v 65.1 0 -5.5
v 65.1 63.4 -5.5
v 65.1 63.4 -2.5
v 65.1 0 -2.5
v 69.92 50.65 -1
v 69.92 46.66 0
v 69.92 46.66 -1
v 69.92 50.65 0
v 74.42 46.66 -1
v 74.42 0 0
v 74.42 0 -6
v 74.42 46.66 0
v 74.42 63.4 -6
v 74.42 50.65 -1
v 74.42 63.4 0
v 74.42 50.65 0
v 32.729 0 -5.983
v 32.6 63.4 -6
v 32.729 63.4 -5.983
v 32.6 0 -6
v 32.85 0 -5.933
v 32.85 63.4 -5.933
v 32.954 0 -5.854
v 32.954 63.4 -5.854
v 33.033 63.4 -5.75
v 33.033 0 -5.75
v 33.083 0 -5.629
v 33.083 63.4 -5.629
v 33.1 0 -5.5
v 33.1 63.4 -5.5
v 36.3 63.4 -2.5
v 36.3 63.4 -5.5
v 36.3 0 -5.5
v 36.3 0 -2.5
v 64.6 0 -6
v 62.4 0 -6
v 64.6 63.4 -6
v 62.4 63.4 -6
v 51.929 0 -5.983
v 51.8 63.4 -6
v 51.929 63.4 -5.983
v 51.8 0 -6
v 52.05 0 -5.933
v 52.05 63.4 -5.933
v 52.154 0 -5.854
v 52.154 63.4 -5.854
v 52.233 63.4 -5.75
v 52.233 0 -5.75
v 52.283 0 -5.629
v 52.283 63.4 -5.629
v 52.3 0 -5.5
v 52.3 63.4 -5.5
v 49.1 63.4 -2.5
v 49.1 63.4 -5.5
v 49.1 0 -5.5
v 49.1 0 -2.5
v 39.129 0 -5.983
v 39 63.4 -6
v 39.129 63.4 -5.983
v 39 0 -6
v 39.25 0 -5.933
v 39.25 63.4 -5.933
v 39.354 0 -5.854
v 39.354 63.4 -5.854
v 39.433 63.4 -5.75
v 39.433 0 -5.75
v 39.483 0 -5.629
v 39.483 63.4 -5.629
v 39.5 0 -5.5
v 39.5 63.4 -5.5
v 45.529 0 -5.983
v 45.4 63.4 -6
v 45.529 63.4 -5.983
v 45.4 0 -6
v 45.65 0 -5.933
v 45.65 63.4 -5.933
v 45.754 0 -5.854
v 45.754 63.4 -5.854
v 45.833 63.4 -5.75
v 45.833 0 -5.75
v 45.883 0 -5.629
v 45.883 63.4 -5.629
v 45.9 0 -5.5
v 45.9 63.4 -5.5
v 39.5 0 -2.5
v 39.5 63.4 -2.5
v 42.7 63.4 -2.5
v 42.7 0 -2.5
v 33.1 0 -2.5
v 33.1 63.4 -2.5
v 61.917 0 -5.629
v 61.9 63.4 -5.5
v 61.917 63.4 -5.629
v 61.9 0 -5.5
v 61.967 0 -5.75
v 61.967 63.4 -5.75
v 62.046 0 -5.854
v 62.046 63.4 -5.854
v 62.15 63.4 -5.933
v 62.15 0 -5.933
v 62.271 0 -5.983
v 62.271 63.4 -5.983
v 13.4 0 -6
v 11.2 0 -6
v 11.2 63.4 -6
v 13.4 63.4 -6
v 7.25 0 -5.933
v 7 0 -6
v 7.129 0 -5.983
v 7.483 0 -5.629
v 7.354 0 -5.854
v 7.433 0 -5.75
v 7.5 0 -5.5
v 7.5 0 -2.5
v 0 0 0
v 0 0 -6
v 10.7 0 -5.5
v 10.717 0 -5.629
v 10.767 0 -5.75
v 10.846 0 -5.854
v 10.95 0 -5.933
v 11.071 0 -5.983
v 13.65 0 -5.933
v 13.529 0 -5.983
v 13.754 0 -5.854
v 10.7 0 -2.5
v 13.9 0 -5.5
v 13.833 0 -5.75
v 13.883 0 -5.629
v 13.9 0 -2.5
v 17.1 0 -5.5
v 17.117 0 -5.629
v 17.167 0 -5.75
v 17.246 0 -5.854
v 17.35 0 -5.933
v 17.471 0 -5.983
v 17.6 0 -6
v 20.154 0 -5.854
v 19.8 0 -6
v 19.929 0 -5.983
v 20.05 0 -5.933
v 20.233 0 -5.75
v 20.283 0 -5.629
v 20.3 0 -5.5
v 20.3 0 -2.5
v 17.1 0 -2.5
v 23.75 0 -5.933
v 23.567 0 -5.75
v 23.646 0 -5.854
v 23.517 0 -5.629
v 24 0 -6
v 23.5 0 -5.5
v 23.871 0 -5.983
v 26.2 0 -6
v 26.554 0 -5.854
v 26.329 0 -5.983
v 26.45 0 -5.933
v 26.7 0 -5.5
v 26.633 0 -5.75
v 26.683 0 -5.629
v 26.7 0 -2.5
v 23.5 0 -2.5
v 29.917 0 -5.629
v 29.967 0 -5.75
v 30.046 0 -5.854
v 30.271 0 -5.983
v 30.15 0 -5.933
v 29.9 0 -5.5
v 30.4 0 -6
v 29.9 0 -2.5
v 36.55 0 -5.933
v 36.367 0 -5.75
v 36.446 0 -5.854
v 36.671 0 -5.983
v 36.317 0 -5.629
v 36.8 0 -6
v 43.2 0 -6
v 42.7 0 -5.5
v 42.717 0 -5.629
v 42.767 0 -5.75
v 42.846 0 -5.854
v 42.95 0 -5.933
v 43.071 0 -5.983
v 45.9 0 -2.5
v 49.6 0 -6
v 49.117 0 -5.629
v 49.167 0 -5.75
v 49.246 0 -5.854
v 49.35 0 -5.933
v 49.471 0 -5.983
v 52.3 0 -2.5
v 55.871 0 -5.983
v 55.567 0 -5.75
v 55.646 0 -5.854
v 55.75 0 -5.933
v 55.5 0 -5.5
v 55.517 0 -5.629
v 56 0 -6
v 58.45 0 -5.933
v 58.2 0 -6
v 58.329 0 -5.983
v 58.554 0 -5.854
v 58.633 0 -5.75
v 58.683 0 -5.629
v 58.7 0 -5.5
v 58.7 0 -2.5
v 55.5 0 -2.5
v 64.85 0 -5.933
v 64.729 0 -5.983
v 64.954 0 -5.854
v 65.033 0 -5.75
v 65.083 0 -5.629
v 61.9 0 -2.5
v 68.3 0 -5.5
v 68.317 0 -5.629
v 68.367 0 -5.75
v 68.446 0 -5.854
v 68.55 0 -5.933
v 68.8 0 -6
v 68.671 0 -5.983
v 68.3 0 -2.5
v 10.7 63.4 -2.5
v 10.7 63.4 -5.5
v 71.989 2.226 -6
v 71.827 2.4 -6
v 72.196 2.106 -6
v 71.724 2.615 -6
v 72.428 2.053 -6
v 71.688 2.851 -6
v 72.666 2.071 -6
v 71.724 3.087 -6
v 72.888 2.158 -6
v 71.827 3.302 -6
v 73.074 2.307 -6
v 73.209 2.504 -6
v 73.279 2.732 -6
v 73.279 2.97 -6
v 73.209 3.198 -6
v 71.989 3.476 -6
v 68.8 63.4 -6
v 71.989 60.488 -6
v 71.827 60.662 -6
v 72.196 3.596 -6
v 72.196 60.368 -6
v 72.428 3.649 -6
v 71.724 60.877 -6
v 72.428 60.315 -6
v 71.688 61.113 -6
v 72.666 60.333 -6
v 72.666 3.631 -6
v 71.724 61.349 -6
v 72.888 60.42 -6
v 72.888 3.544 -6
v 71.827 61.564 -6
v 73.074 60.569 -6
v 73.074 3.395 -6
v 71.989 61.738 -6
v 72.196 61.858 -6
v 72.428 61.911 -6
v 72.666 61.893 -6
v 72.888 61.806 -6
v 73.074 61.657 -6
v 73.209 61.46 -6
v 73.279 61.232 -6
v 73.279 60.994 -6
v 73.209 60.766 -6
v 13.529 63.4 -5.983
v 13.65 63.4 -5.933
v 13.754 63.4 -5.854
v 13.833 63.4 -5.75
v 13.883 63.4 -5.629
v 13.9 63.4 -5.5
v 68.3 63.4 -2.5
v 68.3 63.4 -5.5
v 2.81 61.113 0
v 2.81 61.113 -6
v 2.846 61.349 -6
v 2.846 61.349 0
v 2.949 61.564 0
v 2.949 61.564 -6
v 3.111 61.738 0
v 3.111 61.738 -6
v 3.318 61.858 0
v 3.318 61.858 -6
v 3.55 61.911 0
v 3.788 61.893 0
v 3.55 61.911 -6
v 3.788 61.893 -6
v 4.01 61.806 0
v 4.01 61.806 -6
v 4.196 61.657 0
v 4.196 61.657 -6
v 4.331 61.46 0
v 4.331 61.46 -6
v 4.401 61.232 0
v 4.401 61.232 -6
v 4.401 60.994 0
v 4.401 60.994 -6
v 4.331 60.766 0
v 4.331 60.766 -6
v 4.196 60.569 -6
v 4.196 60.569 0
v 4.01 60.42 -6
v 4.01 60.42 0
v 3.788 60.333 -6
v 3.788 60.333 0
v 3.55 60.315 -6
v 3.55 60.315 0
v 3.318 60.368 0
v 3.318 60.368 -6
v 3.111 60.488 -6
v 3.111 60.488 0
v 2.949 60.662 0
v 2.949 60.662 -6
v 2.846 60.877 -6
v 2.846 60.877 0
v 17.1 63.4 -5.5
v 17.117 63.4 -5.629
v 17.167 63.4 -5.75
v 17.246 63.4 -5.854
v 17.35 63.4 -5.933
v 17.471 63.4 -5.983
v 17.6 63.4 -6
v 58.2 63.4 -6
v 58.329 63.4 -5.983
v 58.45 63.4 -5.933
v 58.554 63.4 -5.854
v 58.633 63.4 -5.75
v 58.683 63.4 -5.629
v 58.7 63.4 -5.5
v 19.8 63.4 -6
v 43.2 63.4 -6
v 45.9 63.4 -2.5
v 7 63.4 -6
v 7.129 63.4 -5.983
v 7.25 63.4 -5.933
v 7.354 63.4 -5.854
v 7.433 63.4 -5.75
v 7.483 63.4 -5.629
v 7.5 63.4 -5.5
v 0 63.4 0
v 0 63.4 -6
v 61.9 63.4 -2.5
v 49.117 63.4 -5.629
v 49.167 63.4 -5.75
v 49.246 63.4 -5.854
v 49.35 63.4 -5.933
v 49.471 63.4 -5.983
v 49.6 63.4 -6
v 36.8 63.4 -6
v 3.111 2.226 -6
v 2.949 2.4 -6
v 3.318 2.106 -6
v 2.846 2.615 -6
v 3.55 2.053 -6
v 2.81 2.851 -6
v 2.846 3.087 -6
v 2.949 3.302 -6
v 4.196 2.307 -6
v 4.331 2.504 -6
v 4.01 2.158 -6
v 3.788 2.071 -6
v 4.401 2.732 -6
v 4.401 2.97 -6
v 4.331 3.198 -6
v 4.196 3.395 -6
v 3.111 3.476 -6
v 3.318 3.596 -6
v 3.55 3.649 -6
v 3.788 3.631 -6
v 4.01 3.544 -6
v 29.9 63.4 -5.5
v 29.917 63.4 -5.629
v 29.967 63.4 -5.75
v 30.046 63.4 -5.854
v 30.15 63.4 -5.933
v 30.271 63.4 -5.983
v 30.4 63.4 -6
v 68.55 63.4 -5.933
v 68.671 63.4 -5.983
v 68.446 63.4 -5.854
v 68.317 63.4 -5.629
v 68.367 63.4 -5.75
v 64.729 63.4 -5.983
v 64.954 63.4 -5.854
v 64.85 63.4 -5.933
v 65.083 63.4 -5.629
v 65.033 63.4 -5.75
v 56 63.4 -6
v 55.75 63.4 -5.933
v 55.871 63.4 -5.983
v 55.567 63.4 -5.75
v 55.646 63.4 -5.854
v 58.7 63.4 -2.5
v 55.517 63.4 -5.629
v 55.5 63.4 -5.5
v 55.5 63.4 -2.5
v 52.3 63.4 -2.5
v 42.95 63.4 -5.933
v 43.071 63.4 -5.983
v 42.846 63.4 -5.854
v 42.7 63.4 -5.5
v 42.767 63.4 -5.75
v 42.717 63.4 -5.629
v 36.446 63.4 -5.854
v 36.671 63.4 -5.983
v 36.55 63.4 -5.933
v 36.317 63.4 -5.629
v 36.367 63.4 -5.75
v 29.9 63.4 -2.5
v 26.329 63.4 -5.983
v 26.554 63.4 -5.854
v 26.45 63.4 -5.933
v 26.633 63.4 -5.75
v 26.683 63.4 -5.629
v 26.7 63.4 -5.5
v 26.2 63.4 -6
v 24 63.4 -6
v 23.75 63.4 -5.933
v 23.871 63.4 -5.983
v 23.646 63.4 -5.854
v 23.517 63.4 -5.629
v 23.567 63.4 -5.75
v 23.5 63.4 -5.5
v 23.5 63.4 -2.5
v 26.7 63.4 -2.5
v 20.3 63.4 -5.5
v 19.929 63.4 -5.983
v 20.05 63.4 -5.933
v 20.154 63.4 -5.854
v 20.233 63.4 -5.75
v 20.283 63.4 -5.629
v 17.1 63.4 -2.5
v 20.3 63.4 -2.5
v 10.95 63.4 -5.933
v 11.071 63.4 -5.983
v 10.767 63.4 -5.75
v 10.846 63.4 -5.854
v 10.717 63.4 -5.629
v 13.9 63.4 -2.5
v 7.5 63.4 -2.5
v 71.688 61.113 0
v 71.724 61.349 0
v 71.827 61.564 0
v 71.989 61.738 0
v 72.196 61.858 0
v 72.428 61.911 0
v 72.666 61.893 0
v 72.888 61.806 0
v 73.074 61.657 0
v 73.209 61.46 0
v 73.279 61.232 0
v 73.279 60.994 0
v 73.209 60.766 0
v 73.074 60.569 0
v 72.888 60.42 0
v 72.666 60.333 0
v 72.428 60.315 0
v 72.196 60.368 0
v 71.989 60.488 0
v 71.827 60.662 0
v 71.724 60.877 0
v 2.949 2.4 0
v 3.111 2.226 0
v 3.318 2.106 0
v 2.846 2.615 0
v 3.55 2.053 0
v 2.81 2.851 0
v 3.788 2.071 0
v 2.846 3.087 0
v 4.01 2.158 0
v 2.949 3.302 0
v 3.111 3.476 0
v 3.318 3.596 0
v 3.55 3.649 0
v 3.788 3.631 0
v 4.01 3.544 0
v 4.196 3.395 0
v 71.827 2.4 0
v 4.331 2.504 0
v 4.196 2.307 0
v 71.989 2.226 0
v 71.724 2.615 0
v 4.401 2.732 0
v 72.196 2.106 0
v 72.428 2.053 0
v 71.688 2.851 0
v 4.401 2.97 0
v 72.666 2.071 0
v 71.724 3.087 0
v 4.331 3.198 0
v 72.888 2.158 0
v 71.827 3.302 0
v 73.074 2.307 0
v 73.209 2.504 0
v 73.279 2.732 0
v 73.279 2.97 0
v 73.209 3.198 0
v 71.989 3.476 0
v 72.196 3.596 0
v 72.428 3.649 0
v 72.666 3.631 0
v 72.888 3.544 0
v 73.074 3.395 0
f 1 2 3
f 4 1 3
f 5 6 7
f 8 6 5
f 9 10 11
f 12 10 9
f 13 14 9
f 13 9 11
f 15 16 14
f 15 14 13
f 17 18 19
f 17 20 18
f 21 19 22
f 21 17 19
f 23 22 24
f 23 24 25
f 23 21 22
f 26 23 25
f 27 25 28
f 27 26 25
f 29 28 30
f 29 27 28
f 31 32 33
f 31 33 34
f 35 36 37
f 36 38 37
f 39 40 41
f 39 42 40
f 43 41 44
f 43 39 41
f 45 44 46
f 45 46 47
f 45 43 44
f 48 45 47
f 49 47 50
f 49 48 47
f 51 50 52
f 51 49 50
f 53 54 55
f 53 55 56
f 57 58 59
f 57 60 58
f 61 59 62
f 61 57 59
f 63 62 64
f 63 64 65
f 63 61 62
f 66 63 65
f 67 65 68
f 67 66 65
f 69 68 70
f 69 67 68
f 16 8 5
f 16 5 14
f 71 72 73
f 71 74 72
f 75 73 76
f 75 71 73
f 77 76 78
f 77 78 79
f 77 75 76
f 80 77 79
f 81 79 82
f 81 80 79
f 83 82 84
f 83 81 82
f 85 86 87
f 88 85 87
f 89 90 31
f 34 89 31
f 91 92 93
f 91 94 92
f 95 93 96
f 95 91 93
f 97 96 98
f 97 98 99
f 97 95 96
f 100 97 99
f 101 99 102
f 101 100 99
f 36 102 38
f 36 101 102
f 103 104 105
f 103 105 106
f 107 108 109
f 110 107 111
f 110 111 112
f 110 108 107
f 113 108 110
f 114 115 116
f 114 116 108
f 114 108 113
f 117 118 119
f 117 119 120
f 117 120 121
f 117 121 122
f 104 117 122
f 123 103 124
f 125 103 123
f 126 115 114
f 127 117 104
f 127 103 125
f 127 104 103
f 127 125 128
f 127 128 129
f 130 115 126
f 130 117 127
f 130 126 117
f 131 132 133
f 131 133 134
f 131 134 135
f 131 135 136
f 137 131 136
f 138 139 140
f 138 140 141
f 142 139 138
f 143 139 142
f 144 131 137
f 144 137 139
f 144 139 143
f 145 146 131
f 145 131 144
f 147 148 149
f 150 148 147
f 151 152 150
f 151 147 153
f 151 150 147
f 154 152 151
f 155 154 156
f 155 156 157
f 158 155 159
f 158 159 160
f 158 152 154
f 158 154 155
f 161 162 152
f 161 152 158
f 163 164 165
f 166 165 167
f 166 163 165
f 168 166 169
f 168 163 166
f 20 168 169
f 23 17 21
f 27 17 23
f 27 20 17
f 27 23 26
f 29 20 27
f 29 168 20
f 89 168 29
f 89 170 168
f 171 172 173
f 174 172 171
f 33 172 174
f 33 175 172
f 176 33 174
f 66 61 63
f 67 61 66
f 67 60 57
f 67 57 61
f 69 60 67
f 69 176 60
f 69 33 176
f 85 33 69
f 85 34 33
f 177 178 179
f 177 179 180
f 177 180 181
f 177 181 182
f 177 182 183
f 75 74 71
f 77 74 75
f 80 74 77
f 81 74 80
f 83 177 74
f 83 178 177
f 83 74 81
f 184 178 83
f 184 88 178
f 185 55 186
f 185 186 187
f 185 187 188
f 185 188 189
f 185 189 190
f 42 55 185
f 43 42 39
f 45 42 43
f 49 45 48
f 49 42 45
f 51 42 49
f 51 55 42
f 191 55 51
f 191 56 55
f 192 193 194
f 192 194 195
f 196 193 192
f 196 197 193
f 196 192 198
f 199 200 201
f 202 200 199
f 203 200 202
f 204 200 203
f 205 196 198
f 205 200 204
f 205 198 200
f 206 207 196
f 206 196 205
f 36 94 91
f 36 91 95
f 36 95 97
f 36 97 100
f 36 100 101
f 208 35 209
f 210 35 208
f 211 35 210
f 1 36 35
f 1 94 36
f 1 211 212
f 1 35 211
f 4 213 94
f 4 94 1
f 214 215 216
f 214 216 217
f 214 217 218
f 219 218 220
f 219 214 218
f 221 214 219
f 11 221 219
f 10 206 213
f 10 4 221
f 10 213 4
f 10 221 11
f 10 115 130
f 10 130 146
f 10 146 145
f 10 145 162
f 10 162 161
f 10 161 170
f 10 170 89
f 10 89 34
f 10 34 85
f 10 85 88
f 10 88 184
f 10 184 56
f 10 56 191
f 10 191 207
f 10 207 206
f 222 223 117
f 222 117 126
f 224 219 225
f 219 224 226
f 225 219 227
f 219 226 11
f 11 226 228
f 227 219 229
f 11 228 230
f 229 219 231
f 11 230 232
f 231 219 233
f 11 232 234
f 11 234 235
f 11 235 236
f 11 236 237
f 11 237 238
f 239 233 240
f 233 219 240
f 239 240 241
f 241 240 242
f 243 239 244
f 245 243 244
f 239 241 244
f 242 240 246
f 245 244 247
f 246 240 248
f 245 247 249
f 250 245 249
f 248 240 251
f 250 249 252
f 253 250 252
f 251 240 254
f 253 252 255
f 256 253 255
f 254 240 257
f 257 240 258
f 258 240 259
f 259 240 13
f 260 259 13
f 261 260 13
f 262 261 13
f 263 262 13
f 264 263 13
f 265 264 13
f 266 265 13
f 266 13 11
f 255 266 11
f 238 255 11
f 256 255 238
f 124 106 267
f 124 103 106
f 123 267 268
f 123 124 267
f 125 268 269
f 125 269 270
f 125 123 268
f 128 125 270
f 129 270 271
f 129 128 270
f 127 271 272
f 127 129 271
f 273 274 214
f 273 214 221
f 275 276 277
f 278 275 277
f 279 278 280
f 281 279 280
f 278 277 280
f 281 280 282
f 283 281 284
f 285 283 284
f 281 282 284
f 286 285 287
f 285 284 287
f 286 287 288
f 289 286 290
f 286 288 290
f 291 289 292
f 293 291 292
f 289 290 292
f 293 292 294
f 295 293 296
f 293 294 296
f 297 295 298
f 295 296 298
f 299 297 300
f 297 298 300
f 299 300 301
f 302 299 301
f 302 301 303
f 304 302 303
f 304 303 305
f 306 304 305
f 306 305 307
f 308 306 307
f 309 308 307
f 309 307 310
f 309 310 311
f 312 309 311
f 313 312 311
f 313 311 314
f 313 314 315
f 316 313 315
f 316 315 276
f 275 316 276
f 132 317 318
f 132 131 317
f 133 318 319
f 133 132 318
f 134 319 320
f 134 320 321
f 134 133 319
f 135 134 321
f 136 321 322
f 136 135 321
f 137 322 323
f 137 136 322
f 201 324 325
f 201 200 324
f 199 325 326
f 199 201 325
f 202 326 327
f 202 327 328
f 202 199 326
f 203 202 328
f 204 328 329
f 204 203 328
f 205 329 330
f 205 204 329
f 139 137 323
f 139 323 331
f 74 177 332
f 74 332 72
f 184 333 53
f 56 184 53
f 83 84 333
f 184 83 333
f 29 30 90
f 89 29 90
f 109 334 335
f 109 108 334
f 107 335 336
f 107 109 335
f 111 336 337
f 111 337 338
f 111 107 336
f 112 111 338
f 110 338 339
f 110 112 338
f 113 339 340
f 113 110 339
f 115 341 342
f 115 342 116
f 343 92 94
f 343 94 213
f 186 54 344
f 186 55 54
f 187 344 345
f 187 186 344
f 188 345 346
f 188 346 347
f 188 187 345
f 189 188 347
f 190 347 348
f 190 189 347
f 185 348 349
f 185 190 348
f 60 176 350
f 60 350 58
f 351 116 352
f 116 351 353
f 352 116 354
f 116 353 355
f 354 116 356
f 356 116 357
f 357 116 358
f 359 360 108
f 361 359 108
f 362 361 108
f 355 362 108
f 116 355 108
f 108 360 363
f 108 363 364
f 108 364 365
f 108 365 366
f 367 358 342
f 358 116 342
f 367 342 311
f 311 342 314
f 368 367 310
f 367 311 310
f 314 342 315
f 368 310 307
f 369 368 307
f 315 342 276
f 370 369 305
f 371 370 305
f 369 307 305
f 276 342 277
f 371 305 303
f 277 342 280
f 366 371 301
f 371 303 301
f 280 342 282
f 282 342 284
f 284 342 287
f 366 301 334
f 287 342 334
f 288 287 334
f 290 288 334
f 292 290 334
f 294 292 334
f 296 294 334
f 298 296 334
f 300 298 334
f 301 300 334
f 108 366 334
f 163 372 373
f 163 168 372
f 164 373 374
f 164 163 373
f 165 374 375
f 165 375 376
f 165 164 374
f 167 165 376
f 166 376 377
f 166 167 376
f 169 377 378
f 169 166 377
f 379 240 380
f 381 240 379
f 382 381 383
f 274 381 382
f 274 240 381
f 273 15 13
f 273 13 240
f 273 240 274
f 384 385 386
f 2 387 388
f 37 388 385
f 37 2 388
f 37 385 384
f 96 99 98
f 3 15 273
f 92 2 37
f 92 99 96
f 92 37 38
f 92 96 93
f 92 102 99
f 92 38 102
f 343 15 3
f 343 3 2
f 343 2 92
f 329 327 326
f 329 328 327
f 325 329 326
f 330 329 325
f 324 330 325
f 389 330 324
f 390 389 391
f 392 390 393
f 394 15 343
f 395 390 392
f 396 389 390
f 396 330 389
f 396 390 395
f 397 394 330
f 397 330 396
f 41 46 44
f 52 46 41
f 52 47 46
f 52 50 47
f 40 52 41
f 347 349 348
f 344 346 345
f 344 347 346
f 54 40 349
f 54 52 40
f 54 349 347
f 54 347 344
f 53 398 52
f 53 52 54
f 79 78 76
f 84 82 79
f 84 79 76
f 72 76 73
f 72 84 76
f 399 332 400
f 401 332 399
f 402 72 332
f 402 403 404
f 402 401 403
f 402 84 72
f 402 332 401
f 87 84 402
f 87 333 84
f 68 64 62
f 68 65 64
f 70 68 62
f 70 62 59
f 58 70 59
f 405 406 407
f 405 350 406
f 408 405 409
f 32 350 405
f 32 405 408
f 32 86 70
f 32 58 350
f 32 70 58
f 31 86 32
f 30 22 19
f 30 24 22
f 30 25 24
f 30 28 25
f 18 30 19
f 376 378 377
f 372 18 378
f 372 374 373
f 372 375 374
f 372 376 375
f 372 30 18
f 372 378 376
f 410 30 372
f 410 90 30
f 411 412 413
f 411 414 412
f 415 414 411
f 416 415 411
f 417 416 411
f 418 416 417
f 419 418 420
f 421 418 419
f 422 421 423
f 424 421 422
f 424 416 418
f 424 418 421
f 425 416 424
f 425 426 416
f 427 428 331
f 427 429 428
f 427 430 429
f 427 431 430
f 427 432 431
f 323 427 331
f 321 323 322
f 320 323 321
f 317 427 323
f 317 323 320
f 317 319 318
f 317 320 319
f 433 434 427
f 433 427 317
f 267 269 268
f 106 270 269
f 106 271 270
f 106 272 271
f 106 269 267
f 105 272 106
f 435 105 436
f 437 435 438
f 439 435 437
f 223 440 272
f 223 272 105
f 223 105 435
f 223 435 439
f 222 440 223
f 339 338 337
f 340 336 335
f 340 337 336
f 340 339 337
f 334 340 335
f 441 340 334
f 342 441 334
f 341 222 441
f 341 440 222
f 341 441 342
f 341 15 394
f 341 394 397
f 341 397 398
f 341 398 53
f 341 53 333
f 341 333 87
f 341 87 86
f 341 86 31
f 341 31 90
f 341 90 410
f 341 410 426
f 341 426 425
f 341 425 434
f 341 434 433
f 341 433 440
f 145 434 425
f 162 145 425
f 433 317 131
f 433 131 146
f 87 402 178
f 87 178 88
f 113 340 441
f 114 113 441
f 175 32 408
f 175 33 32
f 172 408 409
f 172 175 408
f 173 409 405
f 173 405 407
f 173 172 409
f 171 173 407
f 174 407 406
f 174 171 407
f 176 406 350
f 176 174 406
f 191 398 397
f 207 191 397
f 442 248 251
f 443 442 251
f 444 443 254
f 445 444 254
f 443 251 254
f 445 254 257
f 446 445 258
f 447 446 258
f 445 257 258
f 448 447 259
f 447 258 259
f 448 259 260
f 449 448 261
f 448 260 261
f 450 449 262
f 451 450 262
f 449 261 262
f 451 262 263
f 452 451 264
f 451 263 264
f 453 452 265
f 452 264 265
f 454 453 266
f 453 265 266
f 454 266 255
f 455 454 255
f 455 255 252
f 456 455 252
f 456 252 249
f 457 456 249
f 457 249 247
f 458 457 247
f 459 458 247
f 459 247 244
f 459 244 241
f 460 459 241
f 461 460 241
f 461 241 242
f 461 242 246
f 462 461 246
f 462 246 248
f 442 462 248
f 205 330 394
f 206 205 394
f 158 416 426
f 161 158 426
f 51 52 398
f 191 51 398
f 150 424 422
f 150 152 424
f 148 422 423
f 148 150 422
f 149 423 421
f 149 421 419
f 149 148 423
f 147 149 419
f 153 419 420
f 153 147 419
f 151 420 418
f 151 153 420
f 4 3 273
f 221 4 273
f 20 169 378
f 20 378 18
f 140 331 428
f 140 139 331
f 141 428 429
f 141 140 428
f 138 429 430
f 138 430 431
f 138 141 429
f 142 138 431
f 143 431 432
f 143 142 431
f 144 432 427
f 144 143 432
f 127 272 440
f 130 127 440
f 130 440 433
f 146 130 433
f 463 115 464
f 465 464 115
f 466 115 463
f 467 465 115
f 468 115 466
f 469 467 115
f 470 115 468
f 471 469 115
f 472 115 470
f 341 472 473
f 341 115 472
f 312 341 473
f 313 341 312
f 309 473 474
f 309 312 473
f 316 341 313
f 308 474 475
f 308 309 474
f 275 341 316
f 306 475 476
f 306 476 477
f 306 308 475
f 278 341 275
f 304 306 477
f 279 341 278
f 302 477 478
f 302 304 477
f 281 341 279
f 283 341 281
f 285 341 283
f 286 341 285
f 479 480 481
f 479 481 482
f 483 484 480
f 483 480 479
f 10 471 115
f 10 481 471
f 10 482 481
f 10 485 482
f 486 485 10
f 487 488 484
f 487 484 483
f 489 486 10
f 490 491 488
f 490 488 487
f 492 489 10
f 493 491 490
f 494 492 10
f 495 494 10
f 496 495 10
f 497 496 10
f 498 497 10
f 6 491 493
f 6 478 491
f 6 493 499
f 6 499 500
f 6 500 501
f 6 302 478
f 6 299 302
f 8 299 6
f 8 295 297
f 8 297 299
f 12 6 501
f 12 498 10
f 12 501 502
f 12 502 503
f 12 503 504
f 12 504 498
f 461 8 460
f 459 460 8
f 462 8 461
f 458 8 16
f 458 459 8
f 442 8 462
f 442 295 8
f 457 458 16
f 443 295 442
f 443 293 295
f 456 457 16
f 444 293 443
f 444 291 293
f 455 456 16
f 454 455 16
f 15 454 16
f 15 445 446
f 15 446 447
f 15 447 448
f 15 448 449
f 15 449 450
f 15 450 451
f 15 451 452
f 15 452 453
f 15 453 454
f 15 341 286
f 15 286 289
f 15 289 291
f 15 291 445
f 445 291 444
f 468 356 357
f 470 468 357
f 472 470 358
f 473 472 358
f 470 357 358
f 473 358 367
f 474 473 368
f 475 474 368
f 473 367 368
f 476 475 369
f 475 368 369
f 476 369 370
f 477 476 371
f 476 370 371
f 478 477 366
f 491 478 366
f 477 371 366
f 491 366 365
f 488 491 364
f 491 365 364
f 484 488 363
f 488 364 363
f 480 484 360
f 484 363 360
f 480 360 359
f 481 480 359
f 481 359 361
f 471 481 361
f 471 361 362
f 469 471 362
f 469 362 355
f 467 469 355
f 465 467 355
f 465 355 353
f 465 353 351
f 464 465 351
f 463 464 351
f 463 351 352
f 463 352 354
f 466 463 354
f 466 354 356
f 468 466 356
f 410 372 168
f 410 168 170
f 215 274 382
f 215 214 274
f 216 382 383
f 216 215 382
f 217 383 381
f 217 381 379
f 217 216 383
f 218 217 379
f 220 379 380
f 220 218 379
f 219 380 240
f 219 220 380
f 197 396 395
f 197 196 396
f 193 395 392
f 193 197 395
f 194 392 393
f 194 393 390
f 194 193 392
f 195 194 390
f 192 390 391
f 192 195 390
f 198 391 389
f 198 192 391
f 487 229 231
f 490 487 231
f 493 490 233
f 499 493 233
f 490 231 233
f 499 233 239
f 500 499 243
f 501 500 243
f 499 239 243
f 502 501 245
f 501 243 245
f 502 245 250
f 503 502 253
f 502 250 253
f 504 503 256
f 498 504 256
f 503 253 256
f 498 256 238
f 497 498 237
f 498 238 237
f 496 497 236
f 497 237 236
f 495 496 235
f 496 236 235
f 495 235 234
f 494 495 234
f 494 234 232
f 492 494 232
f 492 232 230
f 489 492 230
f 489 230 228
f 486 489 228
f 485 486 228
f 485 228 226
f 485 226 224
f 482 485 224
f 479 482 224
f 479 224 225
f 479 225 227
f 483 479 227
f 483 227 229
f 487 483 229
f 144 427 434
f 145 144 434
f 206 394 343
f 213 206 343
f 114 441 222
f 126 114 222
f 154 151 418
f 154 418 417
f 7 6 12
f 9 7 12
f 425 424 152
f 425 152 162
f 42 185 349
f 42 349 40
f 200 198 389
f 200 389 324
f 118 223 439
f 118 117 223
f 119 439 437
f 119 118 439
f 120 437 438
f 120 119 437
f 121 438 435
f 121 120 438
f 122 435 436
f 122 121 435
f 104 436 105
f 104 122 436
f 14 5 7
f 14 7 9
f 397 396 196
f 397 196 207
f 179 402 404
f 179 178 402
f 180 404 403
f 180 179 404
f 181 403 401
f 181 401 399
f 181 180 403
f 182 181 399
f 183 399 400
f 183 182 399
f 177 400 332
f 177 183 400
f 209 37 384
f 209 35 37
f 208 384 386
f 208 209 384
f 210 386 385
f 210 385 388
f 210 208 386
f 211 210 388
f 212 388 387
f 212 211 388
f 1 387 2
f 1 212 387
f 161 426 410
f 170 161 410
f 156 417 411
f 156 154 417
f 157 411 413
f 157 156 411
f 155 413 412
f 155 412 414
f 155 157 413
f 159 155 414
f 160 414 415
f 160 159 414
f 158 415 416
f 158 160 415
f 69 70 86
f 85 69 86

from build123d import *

# Parameters (mm, degrees)
SKETCH_1_W               = 74.42
SKETCH_1_H               = 63.4
EXTRUDE_1_DEPTH          = 6
SKETCH_1_3_W             = 4.5
SKETCH_1_3_H             = 3.99
CUT_EXTRUDE_1_DEPTH      = 1
HOLE_WIZARD_M2_10_D      = 1.6
CUT_EXTRUDE_2_DEPTH      = 98.948437456
CUT_EXTRUDE_2_DEPTH_BACK = 98.948437456
SKETCH_19_W              = 3.2
SKETCH_19_H              = 3.5
FILLET_2_R               = 0.5


with BuildPart() as part:
    # 草图1 → 凸台-拉伸1 (new body)
    with BuildSketch(Plane.XY):
        with Locations((37.21, 31.7)):
            Rectangle(SKETCH_1_W, SKETCH_1_H)
    extrude(amount=-EXTRUDE_1_DEPTH)

    # 草图1<3> → 切除-拉伸1 (cut)
    with BuildSketch(Plane.XY):
        with Locations((72.17, 48.655)):
            Rectangle(SKETCH_1_3_W, SKETCH_1_3_H)
    extrude(amount=-CUT_EXTRUDE_1_DEPTH, mode=Mode.SUBTRACT)

    # M2 螺纹孔10 (through all)
    with Locations(Plane.XY):
        with Locations((3.61, 61.113), (72.488, 61.113), (72.488, 2.851), (3.61, 2.851)):
            Hole(HOLE_WIZARD_M2_10_D / 2)

    # 草图19 → 切除-拉伸2 (cut, two sides: drawn at the far end of the back side and taken through both)
    with BuildSketch(Plane.XZ.offset(-CUT_EXTRUDE_2_DEPTH_BACK)):
        with Locations((66.7, -4.25)):
            Rectangle(SKETCH_19_W, SKETCH_19_H)
        with Locations((60.3, -4.25)):
            Rectangle(SKETCH_19_W, SKETCH_19_H)
        with Locations((53.9, -4.25)):
            Rectangle(SKETCH_19_W, SKETCH_19_H)
        with Locations((47.5, -4.25)):
            Rectangle(SKETCH_19_W, SKETCH_19_H)
        with Locations((41.1, -4.25)):
            Rectangle(SKETCH_19_W, SKETCH_19_H)
        with Locations((34.7, -4.25)):
            Rectangle(SKETCH_19_W, SKETCH_19_H)
        with Locations((28.3, -4.25)):
            Rectangle(SKETCH_19_W, SKETCH_19_H)
        with Locations((21.9, -4.25)):
            Rectangle(SKETCH_19_W, SKETCH_19_H)
        with Locations((15.5, -4.25)):
            Rectangle(SKETCH_19_W, SKETCH_19_H)
        with Locations((9.1, -4.25)):
            Rectangle(SKETCH_19_W, SKETCH_19_H)
    extrude(amount=CUT_EXTRUDE_2_DEPTH + CUT_EXTRUDE_2_DEPTH_BACK, mode=Mode.SUBTRACT)

    # 圆角2
    fillet_2_edges = [part.edges().sort_by_distance(p)[0] for p in [
        (68.3, 31.7, -6),
        (61.9, 31.7, -6),
        (55.5, 31.7, -6),
        (49.1, 31.7, -6),
        (42.7, 31.7, -6),
        (36.3, 31.7, -6),
        (29.9, 31.7, -6),
        (23.5, 31.7, -6),
        (17.1, 31.7, -6),
        (10.7, 31.7, -6),
        (65.1, 31.7, -6),
        (58.7, 31.7, -6),
        (52.3, 31.7, -6),
        (45.9, 31.7, -6),
        (39.5, 31.7, -6),
        (33.1, 31.7, -6),
        (26.7, 31.7, -6),
        (20.3, 31.7, -6),
        (13.9, 31.7, -6),
        (7.5, 31.7, -6),
    ]]
    fillet(fillet_2_edges, radius=FILLET_2_R)


solid = part.part
